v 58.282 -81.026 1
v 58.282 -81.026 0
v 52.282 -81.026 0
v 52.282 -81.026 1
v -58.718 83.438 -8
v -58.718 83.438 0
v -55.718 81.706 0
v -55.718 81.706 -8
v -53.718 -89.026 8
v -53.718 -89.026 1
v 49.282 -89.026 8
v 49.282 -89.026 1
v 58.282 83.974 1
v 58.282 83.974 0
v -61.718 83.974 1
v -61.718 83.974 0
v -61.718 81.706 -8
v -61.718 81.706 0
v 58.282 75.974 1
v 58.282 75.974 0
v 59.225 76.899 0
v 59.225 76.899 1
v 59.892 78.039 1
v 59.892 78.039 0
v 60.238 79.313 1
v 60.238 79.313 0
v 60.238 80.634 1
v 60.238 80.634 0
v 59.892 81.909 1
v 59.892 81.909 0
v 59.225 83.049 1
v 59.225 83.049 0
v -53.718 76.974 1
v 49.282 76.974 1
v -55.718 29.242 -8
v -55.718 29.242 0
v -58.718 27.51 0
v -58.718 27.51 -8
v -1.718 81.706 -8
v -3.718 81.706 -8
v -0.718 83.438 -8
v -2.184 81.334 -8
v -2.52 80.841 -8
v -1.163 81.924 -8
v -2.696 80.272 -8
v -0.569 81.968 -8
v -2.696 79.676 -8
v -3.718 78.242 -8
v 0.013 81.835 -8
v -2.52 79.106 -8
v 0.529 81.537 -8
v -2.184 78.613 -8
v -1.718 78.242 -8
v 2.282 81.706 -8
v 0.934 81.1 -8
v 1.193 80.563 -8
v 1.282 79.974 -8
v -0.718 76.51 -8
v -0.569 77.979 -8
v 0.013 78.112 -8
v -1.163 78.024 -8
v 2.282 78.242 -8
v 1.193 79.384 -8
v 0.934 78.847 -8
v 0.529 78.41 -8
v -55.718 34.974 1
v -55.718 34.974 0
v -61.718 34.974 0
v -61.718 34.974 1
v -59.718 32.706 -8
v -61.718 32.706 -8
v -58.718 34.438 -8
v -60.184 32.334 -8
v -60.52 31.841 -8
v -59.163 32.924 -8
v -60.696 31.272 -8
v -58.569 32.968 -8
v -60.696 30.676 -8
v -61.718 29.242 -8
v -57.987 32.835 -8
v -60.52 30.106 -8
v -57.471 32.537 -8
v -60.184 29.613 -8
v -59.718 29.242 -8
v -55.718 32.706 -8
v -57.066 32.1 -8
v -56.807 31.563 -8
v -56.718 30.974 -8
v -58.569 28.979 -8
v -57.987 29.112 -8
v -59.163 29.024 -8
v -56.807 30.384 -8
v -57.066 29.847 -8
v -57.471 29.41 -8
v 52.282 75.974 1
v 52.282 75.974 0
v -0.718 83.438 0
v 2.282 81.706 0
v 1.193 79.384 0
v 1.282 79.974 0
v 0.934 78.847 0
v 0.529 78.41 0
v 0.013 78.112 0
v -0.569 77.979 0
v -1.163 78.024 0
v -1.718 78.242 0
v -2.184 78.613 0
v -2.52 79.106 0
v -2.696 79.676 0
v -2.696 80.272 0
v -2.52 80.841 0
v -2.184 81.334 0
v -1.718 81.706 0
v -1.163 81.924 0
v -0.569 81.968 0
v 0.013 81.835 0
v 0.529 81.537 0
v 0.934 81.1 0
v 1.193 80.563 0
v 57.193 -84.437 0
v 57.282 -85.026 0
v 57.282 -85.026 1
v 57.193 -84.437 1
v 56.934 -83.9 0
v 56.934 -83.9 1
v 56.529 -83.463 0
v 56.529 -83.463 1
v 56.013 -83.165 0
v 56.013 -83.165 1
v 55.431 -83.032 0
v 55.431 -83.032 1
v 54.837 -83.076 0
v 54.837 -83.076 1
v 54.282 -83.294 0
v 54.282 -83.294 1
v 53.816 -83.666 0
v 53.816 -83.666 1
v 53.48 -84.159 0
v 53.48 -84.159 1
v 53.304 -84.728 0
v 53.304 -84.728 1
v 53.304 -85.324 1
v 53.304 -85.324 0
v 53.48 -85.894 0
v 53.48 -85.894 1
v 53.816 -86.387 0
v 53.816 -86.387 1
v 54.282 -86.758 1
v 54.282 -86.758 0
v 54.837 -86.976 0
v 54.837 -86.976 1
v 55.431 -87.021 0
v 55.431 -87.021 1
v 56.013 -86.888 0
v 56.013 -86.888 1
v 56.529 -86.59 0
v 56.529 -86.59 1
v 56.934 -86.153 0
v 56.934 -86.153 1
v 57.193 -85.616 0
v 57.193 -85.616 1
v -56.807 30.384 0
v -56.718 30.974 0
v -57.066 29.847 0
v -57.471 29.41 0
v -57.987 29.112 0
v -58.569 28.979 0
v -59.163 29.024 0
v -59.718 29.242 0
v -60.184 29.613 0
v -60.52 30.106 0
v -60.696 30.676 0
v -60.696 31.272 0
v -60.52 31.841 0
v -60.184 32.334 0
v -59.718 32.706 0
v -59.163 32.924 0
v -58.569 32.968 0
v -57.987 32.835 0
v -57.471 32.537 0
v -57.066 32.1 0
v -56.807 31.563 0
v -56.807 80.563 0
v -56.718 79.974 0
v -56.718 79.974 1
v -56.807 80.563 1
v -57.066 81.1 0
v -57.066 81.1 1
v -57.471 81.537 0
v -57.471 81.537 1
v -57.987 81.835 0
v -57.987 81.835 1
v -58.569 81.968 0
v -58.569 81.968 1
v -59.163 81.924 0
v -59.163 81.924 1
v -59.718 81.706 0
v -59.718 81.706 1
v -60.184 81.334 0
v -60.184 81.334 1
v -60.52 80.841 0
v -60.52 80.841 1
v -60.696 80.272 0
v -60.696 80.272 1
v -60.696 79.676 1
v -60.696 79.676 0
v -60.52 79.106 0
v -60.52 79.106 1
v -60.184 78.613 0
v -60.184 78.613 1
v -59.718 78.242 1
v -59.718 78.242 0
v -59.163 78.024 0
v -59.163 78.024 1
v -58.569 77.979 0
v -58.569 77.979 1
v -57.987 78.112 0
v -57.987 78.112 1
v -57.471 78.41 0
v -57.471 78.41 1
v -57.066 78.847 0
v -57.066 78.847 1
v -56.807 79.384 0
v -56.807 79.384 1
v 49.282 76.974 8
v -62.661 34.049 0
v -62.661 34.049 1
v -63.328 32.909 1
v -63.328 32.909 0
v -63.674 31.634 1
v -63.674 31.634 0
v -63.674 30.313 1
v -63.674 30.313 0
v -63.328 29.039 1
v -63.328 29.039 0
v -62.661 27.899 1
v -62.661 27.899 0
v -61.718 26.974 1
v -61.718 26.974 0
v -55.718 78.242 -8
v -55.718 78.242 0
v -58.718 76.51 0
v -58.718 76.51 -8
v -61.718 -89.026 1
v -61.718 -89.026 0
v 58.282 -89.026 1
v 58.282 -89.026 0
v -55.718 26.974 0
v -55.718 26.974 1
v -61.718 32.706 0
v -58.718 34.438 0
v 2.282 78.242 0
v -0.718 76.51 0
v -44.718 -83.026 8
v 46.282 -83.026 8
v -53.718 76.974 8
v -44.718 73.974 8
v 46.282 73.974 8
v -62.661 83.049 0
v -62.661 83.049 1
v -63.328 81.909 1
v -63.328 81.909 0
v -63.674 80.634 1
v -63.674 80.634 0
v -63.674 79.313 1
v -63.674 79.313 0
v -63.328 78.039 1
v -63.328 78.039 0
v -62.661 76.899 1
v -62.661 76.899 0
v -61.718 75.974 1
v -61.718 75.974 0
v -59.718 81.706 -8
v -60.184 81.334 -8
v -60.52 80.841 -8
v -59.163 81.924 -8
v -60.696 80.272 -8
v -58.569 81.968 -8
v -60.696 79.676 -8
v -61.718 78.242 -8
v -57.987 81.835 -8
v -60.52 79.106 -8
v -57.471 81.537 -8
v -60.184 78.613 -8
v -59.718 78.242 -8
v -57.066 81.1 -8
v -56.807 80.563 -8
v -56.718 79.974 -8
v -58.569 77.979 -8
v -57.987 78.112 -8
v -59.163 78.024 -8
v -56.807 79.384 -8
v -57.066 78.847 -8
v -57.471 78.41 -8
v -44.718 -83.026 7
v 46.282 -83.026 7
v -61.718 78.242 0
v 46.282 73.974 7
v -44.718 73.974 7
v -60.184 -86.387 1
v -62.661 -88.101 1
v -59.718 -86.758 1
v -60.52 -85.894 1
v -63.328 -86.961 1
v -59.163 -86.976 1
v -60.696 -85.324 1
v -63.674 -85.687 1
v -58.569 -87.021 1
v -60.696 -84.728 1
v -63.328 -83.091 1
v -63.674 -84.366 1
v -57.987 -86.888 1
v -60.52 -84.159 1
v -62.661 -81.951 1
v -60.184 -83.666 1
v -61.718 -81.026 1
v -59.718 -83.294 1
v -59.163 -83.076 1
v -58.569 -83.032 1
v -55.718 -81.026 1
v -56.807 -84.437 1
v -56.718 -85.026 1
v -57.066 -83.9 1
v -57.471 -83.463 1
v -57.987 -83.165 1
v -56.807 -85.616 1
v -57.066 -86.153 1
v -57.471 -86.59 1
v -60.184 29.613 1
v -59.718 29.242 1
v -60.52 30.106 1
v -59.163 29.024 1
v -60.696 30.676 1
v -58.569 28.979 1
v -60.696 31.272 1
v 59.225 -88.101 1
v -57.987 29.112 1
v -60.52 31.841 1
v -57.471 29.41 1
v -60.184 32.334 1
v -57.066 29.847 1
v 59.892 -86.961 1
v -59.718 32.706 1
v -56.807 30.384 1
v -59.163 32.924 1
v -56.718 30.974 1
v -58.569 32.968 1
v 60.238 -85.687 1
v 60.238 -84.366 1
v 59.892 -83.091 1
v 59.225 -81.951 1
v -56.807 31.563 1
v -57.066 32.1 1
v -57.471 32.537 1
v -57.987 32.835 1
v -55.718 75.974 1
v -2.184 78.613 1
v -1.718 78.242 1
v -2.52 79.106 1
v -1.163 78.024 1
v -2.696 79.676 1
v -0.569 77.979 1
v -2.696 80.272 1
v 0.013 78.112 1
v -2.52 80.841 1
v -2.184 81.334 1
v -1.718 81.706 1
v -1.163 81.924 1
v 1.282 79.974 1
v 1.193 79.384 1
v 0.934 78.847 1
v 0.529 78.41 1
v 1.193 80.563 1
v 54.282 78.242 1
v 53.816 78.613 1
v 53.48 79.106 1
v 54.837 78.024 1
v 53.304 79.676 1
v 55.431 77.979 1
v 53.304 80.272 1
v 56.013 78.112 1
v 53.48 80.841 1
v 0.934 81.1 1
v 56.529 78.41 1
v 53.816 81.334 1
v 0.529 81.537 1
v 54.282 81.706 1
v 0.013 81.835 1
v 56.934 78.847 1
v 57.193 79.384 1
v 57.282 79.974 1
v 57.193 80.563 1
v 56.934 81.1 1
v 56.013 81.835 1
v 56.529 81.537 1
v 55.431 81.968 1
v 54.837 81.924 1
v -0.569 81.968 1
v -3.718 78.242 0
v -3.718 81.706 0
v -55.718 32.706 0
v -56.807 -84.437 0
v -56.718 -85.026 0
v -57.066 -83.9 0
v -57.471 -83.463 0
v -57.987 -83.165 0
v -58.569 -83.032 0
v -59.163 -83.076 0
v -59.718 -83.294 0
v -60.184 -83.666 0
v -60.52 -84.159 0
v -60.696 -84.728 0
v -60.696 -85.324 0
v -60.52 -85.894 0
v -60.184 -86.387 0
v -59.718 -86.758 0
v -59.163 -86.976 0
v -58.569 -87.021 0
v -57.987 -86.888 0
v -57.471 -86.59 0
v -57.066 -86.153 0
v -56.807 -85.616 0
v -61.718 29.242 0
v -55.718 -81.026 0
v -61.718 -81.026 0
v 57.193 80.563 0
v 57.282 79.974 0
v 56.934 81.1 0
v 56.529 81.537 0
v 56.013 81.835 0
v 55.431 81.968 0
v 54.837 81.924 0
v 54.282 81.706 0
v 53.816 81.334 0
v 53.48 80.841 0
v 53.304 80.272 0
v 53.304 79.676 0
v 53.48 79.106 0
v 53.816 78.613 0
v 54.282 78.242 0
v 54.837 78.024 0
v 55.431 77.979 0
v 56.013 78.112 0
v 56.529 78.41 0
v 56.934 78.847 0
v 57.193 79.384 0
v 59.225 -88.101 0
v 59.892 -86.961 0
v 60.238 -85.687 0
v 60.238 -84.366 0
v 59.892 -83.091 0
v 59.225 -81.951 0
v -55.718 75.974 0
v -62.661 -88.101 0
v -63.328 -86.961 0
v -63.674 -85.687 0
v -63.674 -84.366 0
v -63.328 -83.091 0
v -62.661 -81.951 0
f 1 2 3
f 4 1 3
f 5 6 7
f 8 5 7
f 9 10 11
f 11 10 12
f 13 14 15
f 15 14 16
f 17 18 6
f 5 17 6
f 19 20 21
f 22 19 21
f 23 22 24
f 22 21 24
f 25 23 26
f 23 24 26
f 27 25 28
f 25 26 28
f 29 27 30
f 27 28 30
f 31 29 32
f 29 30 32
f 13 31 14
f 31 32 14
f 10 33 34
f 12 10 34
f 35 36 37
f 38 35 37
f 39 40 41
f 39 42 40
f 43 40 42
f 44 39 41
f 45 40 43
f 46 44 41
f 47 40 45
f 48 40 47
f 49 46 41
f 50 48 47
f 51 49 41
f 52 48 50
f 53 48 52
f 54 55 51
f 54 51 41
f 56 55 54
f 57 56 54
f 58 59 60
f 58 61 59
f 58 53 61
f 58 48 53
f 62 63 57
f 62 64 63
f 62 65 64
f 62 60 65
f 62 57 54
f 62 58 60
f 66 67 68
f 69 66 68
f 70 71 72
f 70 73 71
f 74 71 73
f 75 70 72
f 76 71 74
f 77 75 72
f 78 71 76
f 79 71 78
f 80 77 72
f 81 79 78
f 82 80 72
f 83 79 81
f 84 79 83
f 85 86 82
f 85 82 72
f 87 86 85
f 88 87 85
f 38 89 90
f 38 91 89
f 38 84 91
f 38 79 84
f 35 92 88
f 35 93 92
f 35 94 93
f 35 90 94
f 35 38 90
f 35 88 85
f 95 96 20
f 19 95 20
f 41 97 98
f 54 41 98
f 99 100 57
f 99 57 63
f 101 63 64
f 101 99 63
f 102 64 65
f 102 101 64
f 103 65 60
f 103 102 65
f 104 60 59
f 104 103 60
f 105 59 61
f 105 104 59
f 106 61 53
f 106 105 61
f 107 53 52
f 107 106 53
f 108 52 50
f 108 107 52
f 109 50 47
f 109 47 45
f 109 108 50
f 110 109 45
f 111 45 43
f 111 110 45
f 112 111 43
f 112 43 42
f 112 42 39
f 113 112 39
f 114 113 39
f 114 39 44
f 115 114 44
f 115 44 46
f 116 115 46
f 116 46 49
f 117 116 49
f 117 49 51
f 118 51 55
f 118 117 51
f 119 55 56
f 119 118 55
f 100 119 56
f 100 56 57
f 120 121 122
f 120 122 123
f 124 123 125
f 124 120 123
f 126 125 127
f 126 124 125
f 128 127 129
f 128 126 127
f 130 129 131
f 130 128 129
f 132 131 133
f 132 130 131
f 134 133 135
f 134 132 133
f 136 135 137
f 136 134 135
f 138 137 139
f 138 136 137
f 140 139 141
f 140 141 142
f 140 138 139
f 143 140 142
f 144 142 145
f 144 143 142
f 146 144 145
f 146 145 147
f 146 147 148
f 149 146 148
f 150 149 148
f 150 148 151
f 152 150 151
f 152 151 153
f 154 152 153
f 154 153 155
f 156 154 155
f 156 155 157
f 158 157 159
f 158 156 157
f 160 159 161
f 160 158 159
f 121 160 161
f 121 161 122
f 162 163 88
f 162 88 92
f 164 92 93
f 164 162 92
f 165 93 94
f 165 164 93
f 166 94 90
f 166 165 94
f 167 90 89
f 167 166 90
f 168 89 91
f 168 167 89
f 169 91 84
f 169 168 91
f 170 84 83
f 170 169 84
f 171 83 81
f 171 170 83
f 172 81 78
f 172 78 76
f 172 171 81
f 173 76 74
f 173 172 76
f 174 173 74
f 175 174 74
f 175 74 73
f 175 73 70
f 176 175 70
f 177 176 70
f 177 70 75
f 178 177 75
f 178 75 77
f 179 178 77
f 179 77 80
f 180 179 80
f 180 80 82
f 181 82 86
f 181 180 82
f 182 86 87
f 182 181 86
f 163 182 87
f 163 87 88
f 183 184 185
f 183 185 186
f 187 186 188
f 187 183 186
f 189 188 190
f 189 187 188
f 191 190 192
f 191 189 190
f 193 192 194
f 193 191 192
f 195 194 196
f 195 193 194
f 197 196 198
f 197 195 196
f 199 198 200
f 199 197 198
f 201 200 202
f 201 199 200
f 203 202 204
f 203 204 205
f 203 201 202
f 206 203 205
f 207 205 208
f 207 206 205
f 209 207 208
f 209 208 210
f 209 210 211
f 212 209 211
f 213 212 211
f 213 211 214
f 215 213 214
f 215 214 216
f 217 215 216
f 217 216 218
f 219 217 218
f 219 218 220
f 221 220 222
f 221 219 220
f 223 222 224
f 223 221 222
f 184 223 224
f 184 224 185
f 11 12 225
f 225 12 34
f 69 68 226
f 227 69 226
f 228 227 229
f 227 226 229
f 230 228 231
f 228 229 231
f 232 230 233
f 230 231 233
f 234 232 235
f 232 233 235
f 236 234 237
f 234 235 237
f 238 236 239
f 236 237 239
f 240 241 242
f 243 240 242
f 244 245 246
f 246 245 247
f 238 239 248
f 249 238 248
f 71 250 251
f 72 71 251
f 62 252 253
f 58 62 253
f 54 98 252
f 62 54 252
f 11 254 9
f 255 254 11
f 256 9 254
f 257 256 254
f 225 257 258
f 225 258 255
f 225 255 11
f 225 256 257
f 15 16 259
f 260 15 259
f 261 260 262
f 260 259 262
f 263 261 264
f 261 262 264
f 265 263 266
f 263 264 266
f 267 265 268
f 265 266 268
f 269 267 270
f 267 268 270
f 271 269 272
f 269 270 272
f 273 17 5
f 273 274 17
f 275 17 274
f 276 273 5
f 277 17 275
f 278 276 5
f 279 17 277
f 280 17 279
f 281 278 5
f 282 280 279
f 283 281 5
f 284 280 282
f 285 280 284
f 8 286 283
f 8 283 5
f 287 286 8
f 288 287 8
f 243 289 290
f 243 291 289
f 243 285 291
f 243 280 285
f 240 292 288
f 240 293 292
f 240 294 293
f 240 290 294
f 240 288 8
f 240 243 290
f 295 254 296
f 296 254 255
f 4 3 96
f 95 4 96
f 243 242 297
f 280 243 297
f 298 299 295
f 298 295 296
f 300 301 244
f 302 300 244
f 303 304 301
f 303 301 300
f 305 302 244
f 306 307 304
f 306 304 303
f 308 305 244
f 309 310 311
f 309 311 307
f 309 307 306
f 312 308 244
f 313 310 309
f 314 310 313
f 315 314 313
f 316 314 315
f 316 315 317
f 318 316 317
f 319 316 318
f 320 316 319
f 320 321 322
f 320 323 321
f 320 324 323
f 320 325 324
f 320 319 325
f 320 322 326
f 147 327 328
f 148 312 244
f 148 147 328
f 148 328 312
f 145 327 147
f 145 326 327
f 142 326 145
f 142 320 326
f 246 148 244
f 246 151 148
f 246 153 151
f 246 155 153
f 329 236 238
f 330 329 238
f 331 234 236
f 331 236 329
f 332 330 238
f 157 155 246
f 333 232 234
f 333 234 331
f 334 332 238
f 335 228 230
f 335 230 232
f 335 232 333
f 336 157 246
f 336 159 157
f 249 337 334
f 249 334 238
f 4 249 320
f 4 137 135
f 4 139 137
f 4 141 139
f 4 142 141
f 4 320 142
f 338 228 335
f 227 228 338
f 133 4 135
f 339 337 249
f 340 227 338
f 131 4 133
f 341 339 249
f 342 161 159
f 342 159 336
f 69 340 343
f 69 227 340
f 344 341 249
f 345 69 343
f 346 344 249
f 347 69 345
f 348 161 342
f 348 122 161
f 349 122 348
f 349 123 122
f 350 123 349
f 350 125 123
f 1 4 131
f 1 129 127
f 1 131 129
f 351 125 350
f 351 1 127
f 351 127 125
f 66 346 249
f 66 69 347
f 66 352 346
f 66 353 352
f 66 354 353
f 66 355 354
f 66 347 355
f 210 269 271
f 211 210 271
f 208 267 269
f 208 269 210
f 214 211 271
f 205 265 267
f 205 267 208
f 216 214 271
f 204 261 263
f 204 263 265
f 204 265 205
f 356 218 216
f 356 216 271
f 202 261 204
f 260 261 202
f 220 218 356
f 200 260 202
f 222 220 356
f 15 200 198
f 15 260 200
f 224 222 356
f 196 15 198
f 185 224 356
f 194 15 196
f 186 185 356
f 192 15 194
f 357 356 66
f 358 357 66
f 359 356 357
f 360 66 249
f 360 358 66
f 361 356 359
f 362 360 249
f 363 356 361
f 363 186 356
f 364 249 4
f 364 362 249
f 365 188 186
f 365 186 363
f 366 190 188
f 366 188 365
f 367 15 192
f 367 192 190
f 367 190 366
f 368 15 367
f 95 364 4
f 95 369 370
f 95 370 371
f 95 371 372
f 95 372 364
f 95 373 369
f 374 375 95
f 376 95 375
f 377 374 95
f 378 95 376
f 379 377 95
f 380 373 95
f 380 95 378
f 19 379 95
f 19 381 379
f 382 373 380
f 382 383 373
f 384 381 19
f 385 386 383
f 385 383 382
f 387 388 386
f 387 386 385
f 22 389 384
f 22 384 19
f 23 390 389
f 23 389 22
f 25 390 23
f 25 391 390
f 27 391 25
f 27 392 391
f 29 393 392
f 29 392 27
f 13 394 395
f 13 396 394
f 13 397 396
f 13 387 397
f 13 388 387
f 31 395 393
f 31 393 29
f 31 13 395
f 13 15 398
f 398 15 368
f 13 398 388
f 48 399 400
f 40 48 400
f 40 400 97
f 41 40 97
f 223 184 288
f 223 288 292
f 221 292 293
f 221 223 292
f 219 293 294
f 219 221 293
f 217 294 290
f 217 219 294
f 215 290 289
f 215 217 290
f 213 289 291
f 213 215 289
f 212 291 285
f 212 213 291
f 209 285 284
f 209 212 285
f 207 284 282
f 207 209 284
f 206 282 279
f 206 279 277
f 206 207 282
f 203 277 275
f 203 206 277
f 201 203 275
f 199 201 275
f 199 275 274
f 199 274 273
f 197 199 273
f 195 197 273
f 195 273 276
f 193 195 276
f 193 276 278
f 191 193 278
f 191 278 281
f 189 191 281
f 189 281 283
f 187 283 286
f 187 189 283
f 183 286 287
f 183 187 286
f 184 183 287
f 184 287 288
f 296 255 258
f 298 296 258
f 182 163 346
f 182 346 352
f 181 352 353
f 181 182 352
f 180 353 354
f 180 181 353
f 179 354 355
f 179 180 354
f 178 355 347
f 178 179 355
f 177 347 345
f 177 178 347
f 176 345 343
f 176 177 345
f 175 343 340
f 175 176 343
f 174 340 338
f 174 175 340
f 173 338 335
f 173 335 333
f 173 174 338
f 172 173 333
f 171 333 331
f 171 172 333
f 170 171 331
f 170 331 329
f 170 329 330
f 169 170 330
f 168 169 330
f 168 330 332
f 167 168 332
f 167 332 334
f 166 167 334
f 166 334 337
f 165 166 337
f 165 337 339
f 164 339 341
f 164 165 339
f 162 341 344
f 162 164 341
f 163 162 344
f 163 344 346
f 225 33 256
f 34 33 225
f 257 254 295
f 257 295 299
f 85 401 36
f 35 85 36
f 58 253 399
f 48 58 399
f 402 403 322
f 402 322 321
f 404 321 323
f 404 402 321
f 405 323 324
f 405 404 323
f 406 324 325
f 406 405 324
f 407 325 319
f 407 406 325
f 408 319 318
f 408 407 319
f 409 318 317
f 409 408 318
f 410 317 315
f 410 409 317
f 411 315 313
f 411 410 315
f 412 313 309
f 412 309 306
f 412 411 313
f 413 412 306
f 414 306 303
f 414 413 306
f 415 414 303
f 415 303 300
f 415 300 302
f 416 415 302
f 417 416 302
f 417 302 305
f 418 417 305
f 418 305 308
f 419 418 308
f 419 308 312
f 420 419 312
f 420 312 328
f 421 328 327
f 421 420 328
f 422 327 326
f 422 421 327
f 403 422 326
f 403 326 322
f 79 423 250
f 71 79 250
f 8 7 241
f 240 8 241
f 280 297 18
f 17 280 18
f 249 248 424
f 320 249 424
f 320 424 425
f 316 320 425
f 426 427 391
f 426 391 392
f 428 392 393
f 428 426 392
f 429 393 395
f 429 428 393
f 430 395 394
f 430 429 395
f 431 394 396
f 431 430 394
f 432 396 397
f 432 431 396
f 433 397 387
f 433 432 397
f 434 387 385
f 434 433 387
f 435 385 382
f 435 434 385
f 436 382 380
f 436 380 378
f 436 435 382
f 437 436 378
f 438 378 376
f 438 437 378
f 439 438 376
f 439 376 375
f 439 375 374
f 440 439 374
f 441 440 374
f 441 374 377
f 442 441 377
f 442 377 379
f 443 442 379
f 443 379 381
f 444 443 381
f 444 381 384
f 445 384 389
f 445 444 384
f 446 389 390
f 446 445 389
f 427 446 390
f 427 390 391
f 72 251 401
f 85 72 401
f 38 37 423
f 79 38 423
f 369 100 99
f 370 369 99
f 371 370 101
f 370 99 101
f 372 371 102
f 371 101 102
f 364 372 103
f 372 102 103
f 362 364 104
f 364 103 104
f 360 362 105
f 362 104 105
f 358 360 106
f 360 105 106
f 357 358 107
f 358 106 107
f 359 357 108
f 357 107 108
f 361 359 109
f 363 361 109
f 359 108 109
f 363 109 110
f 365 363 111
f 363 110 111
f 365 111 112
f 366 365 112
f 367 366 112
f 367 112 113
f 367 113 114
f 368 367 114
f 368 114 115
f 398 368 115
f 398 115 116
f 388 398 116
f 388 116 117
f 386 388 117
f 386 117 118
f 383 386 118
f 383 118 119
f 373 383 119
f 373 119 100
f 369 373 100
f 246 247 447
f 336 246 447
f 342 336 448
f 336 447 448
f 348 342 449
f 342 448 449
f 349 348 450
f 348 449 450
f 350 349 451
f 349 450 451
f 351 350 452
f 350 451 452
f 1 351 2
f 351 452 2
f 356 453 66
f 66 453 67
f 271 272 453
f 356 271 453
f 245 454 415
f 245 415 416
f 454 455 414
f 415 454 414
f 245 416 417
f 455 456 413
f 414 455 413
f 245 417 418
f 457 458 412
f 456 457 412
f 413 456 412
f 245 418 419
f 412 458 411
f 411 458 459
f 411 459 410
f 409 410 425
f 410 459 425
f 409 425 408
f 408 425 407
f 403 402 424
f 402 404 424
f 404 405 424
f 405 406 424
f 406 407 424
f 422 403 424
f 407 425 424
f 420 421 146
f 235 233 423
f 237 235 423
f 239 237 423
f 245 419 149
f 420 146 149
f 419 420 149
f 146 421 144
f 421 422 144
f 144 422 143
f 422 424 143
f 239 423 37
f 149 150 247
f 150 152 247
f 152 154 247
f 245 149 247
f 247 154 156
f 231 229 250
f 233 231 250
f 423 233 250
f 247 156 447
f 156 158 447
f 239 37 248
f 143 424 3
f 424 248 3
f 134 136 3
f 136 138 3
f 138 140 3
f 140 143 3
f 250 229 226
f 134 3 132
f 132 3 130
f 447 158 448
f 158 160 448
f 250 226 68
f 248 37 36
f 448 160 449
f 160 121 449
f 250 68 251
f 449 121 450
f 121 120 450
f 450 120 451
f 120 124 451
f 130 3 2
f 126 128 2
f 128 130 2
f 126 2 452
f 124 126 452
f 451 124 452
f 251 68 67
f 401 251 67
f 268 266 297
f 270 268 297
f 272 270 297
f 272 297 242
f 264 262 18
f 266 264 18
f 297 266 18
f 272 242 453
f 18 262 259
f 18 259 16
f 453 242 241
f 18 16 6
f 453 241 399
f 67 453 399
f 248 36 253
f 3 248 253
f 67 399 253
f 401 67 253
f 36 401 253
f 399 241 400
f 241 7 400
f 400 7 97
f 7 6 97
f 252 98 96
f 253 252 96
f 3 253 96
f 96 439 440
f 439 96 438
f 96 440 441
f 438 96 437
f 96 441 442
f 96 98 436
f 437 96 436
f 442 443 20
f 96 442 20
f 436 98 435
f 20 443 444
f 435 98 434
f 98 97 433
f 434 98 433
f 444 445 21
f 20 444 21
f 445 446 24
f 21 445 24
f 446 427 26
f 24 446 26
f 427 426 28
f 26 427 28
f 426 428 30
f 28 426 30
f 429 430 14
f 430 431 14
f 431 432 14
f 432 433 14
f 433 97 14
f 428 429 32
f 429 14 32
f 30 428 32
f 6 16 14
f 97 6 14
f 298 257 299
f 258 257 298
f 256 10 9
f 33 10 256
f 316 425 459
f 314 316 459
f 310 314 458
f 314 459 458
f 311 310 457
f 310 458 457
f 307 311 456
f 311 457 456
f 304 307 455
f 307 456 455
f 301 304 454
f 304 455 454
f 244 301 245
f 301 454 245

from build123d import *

# Parameters (mm, degrees)
F0_R     = 2
F1_DEPTH = 1
F2_W     = 103
F2_H     = 166
F3_DEPTH = 7
F4_W     = 91
F4_H     = 157
F5_DEPTH = 1
F6_R     = 2
F7_DEPTH = 8.001
F8_R     = 2
F9_DEPTH = 8


with BuildPart() as f1:
    # F0 (on Top) → F1 (new body)
    with BuildSketch(Plane.XY):
        with BuildLine():
            Line((58.281876, 83.973687), (-61.718124, 83.973687))
            ThreePointArc((-61.718124, 83.973687), (-63.718124, 79.973687), (-61.718124, 75.973687))
            Line((-61.718124, 75.973687), (-55.718124, 75.973687))
            Line((-55.718124, 75.973687), (-55.718124, 34.973687))
            Line((-55.718124, 34.973687), (-61.718124, 34.973687))
            ThreePointArc((-61.718124, 34.973687), (-63.718124, 30.973687), (-61.718124, 26.973687))
            Line((-61.718124, 26.973687), (-55.718124, 26.973687))
            Line((-55.718124, 26.973687), (-55.718124, -81.026313))
            Line((-55.718124, -81.026313), (-61.718124, -81.026313))
            ThreePointArc((-61.718124, -81.026313), (-63.718124, -85.026313), (-61.718124, -89.026313))
            Line((-61.718124, -89.026313), (58.281876, -89.026313))
            ThreePointArc((58.281876, -89.026313), (60.281876, -85.026313), (58.281876, -81.026313))
            Line((58.281876, -81.026313), (52.281876, -81.026313))
            Line((52.281876, -81.026313), (52.281876, 75.973687))
            Line((52.281876, 75.973687), (58.281876, 75.973687))
            ThreePointArc((58.281876, 75.973687), (60.281876, 79.973687), (58.281876, 83.973687))
        make_face()
        with Locations((-58.718124, -85.026313)):
            Circle(F0_R, mode=Mode.SUBTRACT)
        with Locations((55.281876, -85.026313)):
            Circle(F0_R, mode=Mode.SUBTRACT)
        with Locations((-58.718124, 30.973687)):
            Circle(F0_R, mode=Mode.SUBTRACT)
        with Locations((-58.718124, 79.973687)):
            Circle(F0_R, mode=Mode.SUBTRACT)
        with Locations((55.281876, 79.973687)):
            Circle(F0_R, mode=Mode.SUBTRACT)
    extrude(amount=F1_DEPTH)

    # F6 (on face) → F7 (cut, through all)
    with BuildSketch(Plane(origin=(0, 0, 0), x_dir=(1, 0, 0), z_dir=(0, 0, -1))):
        with Locations((-0.718124, -79.973687)):
            Circle(F6_R)
    extrude(amount=-F7_DEPTH, mode=Mode.SUBTRACT)

    # F8 (on face) → F9 (join)
    with BuildSketch(Plane(origin=(0, 0, 0), x_dir=(1, 0, 0), z_dir=(0, 0, -1))):
        Polygon((-3.718124, -78.241636), (-3.718124, -81.705737), (-0.718124, -83.437788), (2.281876, -81.705737), (2.281876, -78.241636), (-0.718124, -76.509585), align=None)
        with Locations((-0.718124, -79.973687)):
            Circle(F8_R, mode=Mode.SUBTRACT)
        Polygon((-61.718124, -78.241636), (-61.718124, -81.705737), (-58.718124, -83.437788), (-55.718124, -81.705737), (-55.718124, -78.241636), (-58.718124, -76.509585), align=None)
        with Locations((-58.718124, -79.973687)):
            Circle(F8_R, mode=Mode.SUBTRACT)
        Polygon((-61.718124, -29.241636), (-61.718124, -32.705737), (-58.718124, -34.437788), (-55.718124, -32.705737), (-55.718124, -29.241636), (-58.718124, -27.509585), align=None)
        with Locations((-58.718124, -30.973687)):
            Circle(F8_R, mode=Mode.SUBTRACT)
    extrude(amount=F9_DEPTH)


with BuildPart() as f3:
    # F2 (on face) → F3 (new body)
    with BuildSketch(Plane.XY.offset(1)):
        with Locations((-2.218124, -6.026313)):
            Rectangle(F2_W, F2_H)
    extrude(amount=F3_DEPTH)

    # F4 (on face) → F5 (cut)
    with BuildSketch(Plane.XY.offset(8)):
        with Locations((0.781876, -4.526313)):
            Rectangle(F4_W, F4_H)
    extrude(amount=-F5_DEPTH, mode=Mode.SUBTRACT)


solid = Compound([f1.part, f3.part])
